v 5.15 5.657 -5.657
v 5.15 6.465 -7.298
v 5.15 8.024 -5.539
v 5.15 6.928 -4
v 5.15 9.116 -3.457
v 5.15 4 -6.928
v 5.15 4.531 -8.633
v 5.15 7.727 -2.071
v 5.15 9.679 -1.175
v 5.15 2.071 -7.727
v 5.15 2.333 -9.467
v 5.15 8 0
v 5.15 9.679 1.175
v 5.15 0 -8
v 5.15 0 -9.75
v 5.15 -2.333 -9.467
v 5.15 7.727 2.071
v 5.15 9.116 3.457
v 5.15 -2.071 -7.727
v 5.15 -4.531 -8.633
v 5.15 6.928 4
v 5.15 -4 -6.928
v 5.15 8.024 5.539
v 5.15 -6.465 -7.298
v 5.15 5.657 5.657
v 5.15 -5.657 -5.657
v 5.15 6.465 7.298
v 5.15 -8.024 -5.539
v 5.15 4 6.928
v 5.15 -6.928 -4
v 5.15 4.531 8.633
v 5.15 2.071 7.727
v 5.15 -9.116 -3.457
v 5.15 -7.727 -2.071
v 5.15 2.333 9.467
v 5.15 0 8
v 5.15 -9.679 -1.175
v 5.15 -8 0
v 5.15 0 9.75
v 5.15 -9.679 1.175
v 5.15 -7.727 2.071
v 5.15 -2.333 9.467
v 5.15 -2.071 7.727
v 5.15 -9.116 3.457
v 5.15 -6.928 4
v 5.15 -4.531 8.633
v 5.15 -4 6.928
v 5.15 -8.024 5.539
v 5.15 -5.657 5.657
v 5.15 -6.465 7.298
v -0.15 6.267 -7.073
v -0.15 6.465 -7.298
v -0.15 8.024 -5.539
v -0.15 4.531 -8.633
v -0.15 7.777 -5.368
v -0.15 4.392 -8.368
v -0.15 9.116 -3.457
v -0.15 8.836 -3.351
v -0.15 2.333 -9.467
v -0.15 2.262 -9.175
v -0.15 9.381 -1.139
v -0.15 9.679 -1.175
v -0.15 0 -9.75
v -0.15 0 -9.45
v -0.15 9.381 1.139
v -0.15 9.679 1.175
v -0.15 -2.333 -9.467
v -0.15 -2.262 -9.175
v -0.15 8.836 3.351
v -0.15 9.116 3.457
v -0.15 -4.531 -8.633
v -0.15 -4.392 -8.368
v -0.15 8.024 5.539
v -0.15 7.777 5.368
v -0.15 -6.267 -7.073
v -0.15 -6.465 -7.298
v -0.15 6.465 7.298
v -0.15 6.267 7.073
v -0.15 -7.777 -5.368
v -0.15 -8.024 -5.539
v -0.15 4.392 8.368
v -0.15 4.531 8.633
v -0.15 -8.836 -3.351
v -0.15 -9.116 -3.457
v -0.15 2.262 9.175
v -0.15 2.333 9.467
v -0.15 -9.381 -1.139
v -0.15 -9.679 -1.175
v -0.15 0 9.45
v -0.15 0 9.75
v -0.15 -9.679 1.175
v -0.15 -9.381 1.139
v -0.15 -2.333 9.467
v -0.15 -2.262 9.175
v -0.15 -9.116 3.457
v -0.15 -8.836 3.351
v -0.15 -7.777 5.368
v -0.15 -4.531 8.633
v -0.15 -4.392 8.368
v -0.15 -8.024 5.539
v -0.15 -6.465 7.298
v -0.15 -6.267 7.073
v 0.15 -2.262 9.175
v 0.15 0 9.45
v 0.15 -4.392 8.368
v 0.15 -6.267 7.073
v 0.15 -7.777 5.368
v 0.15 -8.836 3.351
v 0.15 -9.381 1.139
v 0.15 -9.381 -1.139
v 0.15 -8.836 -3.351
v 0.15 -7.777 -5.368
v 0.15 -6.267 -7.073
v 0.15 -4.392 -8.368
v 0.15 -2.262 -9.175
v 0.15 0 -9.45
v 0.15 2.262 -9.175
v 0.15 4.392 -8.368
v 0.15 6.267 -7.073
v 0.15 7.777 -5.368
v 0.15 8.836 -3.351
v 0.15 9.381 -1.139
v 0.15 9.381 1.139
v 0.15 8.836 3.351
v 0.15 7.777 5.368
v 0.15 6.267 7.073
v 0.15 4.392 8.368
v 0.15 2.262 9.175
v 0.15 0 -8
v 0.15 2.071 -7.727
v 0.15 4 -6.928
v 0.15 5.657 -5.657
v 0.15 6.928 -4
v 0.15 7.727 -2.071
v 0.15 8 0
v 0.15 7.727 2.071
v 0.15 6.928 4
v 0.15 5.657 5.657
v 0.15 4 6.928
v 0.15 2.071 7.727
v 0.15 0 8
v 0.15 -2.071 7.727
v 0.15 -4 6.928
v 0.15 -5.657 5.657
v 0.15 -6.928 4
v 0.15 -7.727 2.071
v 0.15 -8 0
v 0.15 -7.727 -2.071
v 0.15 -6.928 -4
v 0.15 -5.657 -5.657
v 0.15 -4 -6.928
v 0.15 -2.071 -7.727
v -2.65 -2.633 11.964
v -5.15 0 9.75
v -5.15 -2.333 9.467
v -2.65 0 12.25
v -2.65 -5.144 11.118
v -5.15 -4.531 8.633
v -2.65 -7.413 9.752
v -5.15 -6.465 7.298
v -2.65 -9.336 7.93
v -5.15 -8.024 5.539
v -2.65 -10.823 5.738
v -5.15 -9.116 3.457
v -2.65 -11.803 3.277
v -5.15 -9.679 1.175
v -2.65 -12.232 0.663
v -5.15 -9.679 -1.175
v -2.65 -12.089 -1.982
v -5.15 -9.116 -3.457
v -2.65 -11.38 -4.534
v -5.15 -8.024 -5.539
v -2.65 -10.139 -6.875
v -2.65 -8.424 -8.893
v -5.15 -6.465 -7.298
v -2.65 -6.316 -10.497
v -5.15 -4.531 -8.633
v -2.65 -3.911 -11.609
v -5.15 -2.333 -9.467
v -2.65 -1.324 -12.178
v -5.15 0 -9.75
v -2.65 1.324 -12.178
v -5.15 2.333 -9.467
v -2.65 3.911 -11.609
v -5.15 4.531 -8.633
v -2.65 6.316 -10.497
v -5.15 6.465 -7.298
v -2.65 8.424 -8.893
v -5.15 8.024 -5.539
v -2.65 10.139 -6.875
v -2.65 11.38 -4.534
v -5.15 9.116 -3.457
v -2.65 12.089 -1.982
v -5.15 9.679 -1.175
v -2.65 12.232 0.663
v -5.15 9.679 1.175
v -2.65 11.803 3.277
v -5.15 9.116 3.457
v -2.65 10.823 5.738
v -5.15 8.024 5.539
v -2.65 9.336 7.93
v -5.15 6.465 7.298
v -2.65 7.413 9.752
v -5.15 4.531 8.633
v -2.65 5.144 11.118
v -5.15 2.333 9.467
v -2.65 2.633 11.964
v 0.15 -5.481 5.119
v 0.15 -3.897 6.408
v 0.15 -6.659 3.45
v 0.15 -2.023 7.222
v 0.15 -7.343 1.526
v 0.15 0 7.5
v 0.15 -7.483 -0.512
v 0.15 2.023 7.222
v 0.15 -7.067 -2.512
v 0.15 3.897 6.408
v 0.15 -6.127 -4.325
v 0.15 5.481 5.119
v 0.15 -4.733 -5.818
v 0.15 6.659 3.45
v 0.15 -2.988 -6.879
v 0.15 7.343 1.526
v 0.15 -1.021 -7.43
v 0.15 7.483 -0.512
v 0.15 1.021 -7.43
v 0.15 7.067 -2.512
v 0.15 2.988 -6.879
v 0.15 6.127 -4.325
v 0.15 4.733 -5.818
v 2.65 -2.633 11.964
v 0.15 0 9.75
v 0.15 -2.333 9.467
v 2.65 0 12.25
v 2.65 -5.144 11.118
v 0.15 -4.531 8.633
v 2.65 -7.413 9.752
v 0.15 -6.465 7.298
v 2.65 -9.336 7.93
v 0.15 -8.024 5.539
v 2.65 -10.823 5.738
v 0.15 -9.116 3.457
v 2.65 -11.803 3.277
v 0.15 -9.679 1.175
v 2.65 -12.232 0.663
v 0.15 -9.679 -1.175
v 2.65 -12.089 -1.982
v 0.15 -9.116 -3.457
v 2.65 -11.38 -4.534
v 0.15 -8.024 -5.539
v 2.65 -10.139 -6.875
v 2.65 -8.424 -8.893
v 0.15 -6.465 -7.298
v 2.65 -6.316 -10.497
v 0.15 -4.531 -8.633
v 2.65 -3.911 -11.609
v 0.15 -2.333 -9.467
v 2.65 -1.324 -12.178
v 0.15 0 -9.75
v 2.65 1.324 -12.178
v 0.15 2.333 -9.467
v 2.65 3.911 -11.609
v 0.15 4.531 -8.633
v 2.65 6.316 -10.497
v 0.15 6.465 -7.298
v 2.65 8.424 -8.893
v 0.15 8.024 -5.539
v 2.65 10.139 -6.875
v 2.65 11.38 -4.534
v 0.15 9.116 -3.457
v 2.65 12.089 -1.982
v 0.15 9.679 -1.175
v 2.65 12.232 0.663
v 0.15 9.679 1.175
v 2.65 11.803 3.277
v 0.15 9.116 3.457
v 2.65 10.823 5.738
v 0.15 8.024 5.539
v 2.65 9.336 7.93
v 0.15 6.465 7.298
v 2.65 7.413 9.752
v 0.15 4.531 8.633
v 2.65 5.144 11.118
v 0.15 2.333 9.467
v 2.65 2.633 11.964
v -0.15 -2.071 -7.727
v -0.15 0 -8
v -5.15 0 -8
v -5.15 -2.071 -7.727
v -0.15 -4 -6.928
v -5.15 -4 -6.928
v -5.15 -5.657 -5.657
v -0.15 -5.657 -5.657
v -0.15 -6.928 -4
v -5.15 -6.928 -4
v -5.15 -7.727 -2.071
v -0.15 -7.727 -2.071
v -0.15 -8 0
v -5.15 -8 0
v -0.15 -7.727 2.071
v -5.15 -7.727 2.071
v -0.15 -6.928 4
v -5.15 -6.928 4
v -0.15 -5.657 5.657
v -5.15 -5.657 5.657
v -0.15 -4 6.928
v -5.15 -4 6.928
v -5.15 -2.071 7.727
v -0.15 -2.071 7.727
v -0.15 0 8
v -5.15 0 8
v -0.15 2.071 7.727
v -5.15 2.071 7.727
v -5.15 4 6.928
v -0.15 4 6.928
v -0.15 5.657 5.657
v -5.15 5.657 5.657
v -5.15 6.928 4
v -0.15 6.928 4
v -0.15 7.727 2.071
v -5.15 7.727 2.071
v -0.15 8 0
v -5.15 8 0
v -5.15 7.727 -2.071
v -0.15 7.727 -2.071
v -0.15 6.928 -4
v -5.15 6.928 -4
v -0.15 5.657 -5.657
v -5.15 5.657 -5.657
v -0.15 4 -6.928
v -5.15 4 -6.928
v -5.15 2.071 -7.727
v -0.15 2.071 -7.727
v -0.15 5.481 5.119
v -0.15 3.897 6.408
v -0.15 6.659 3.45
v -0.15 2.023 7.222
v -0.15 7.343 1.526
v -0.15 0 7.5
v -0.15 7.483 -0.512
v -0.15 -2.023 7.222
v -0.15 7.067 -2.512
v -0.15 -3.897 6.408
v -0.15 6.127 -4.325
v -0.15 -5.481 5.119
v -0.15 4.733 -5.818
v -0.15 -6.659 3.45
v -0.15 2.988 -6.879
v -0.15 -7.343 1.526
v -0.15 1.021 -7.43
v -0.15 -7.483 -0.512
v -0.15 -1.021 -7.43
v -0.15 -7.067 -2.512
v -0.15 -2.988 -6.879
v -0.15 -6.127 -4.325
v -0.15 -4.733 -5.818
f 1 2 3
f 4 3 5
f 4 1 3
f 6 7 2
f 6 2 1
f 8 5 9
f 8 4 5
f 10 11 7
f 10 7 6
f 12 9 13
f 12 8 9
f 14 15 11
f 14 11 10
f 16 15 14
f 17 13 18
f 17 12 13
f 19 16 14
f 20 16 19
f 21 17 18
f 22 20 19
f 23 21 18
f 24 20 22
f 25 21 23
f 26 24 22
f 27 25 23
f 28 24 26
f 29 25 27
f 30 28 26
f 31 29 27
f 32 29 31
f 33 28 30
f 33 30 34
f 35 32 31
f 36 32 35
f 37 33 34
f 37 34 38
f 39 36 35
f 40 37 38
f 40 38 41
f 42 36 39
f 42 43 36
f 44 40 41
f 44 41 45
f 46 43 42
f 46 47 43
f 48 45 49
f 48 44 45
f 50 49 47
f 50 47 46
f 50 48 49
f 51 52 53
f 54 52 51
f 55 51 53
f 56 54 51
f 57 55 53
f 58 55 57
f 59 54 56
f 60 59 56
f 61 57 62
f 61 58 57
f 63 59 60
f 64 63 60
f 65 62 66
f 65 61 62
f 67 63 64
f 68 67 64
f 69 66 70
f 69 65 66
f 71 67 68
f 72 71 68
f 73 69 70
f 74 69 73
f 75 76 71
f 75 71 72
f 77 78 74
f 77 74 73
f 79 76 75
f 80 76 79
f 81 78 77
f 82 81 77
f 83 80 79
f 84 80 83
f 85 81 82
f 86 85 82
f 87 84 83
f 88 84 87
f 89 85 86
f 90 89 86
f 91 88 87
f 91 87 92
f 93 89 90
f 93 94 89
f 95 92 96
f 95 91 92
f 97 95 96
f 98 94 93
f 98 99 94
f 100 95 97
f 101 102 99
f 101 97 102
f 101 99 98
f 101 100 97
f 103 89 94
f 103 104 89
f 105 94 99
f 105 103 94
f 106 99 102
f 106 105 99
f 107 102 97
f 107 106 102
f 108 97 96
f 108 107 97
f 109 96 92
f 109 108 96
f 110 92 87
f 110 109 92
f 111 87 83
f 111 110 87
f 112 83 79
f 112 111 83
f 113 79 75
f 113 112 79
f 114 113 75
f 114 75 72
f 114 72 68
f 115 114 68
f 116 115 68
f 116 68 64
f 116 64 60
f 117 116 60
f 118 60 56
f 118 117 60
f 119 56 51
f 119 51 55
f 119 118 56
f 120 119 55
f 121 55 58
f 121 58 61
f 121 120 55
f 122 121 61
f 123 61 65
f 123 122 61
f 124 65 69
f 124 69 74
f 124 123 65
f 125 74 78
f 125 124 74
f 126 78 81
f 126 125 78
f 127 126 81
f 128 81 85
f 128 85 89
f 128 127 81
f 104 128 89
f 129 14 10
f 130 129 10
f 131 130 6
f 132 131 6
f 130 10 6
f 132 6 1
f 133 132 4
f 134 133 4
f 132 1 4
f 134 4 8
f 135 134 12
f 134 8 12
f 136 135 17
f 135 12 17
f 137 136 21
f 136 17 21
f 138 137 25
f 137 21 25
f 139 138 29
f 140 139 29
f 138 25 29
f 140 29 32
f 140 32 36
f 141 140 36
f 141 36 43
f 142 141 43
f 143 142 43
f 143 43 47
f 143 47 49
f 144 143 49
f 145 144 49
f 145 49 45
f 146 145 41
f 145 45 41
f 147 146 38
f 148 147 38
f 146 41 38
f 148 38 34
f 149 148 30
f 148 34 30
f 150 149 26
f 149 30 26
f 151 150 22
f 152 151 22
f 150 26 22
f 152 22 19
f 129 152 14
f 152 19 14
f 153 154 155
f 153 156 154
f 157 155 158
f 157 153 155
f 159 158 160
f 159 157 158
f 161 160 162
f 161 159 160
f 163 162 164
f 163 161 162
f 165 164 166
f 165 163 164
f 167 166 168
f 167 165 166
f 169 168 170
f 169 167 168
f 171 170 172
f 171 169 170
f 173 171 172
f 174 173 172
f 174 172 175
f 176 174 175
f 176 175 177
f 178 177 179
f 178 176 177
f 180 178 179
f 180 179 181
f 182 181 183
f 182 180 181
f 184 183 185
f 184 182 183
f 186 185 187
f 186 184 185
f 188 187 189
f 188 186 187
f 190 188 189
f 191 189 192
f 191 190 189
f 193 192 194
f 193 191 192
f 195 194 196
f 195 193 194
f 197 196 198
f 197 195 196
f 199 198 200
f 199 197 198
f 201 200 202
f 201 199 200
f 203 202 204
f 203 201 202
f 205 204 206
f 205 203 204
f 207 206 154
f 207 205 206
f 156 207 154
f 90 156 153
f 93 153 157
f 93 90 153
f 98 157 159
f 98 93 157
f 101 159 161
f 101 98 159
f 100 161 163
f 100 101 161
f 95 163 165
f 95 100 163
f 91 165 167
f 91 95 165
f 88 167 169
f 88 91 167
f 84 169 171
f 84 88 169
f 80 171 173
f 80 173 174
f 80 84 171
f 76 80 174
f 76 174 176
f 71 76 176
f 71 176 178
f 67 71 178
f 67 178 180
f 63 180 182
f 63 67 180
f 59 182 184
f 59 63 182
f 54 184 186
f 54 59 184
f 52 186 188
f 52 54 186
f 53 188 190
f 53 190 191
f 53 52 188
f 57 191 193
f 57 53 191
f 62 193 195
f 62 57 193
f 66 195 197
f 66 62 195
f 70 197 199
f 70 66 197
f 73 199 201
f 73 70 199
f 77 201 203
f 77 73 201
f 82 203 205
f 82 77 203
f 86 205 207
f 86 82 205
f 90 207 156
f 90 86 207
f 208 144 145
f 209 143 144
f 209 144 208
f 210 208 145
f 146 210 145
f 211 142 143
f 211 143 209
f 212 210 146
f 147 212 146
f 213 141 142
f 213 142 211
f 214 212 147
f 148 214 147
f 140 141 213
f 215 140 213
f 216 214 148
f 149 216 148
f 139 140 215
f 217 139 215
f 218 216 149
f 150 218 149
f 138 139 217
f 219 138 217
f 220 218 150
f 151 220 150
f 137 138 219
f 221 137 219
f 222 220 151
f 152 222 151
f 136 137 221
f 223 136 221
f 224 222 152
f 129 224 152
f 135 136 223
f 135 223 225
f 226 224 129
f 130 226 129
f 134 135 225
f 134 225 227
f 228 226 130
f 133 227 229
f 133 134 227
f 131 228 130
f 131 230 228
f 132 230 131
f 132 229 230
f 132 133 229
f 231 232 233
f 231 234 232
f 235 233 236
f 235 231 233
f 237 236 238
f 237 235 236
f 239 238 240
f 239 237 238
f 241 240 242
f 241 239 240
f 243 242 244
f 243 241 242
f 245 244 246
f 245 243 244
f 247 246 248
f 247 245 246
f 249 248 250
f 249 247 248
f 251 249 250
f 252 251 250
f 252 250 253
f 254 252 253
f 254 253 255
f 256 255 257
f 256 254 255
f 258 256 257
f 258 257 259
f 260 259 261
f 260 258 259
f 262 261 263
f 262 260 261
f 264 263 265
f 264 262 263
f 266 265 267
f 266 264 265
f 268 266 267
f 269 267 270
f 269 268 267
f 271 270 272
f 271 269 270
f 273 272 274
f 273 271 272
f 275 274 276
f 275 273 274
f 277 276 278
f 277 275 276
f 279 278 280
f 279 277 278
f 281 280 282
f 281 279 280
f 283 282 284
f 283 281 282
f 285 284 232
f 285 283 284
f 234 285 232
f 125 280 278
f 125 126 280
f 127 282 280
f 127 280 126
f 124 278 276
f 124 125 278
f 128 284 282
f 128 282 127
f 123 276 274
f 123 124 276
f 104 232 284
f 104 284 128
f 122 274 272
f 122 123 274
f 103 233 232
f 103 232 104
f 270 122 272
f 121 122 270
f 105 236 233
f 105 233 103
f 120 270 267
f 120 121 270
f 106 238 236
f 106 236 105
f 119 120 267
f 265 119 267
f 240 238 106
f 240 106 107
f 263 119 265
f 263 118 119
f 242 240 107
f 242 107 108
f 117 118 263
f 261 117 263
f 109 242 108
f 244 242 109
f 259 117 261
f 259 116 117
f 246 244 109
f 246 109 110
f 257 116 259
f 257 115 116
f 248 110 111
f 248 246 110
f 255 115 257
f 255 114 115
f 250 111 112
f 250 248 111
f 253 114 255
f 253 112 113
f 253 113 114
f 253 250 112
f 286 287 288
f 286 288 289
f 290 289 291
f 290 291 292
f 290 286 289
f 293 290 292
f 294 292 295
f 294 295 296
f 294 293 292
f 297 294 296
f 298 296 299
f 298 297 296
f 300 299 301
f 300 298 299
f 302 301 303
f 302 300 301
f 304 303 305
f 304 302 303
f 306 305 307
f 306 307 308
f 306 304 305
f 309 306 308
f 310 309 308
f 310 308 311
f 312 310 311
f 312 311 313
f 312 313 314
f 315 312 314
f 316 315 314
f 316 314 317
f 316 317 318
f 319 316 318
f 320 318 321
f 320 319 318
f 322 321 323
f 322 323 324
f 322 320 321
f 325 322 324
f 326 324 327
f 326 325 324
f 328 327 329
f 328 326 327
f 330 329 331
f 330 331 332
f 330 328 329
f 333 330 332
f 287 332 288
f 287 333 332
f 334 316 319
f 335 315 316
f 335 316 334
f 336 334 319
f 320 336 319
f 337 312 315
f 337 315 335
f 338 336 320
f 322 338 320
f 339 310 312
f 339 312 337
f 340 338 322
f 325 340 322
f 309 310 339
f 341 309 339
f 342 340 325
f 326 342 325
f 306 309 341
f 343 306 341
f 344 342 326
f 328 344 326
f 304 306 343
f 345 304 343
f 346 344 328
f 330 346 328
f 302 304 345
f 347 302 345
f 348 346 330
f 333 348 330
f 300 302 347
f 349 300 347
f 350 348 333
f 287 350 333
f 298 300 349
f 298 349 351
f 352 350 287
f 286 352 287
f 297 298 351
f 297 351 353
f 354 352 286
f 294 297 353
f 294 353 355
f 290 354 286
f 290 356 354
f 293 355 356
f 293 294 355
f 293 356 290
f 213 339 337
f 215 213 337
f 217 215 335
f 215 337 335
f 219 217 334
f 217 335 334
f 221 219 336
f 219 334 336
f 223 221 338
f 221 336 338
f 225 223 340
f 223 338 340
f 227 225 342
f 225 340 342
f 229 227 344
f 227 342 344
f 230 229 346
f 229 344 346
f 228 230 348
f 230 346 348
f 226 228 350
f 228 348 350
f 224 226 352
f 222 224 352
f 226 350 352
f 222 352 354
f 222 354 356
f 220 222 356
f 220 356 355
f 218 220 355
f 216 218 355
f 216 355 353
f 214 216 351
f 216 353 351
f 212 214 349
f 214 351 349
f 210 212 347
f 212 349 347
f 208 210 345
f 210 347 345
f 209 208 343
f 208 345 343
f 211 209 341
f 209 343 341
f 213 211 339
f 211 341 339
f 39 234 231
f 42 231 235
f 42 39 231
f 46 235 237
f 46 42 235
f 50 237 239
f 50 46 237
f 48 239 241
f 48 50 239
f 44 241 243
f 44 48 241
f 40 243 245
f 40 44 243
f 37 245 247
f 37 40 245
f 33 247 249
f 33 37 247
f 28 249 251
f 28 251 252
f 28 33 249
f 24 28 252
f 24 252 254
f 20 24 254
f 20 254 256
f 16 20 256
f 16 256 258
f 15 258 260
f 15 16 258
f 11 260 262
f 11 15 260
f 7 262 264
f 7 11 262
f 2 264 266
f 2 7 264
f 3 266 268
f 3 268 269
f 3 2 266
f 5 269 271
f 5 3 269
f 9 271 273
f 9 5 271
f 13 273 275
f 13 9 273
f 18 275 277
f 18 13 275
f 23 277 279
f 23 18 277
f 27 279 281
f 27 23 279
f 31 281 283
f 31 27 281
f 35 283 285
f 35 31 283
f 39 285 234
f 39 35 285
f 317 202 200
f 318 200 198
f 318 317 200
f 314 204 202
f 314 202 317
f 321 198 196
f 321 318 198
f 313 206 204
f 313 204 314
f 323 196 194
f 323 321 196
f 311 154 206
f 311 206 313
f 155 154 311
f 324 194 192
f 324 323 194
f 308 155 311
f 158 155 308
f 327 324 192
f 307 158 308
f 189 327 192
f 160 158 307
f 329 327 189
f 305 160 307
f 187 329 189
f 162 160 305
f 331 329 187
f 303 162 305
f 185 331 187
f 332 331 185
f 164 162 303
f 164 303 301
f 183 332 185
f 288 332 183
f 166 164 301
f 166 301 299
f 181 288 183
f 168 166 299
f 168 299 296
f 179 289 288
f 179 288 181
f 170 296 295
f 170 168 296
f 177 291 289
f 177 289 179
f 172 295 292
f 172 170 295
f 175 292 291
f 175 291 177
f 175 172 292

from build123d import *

# Parameters (mm, degrees)
ESBO_O2_R             = 8
CORTE_EXTRUS_O1_DEPTH = 5
CORTE_EXTRUS_O2_START = -5
ESBO_O3_R             = 8
CORTE_EXTRUS_O2_DEPTH = 5
ESBO_O4_R             = 7.5
CORTE_EXTRUS_O3_DEPTH = 0.3


with BuildPart() as part:
    # Esboço1 → Revolução1 (revolve)
    with BuildSketch(Plane.XY, mode=Mode.PRIVATE) as revolu_o1_sk:
        Polygon((-5.15, 2.5), (-5.15, 9.75), (-2.65, 12.25), (-0.15, 9.75), (-0.15, 9.45), (0.15, 9.45), (0.15, 9.75), (2.65, 12.25), (5.15, 9.75), (5.15, 2.5), align=None)
    revolve(revolu_o1_sk.sketch.rotate(Axis((-5.77388535, 0, 0), (1, 0, 0)), 90), axis=Axis((-5.77388535, 0, 0), (1, 0, 0)))

    # Esboço2 → Corte-extrusão1 (cut)
    with BuildSketch(Plane(origin=(5.15, 0, 0), x_dir=(0, 0, -1), z_dir=(1, 0, 0))):
        Circle(ESBO_O2_R)
    extrude(amount=-CORTE_EXTRUS_O1_DEPTH, mode=Mode.SUBTRACT)

    # Esboço3 → Corte-extrusão2 (cut)
    with BuildSketch(Plane.ZY.offset(5.15).offset(CORTE_EXTRUS_O2_START)):
        with Locations(Location((0, 0, 0), (0, 0, 180))):
            Circle(ESBO_O3_R)
    extrude(amount=CORTE_EXTRUS_O2_DEPTH, mode=Mode.SUBTRACT)

    # Esboço4 → Corte-extrusão3 (cut)
    with BuildSketch(Plane.ZY.offset(0.15)):
        Circle(ESBO_O4_R)
    extrude(amount=-CORTE_EXTRUS_O3_DEPTH, mode=Mode.SUBTRACT)


solid = part.part
